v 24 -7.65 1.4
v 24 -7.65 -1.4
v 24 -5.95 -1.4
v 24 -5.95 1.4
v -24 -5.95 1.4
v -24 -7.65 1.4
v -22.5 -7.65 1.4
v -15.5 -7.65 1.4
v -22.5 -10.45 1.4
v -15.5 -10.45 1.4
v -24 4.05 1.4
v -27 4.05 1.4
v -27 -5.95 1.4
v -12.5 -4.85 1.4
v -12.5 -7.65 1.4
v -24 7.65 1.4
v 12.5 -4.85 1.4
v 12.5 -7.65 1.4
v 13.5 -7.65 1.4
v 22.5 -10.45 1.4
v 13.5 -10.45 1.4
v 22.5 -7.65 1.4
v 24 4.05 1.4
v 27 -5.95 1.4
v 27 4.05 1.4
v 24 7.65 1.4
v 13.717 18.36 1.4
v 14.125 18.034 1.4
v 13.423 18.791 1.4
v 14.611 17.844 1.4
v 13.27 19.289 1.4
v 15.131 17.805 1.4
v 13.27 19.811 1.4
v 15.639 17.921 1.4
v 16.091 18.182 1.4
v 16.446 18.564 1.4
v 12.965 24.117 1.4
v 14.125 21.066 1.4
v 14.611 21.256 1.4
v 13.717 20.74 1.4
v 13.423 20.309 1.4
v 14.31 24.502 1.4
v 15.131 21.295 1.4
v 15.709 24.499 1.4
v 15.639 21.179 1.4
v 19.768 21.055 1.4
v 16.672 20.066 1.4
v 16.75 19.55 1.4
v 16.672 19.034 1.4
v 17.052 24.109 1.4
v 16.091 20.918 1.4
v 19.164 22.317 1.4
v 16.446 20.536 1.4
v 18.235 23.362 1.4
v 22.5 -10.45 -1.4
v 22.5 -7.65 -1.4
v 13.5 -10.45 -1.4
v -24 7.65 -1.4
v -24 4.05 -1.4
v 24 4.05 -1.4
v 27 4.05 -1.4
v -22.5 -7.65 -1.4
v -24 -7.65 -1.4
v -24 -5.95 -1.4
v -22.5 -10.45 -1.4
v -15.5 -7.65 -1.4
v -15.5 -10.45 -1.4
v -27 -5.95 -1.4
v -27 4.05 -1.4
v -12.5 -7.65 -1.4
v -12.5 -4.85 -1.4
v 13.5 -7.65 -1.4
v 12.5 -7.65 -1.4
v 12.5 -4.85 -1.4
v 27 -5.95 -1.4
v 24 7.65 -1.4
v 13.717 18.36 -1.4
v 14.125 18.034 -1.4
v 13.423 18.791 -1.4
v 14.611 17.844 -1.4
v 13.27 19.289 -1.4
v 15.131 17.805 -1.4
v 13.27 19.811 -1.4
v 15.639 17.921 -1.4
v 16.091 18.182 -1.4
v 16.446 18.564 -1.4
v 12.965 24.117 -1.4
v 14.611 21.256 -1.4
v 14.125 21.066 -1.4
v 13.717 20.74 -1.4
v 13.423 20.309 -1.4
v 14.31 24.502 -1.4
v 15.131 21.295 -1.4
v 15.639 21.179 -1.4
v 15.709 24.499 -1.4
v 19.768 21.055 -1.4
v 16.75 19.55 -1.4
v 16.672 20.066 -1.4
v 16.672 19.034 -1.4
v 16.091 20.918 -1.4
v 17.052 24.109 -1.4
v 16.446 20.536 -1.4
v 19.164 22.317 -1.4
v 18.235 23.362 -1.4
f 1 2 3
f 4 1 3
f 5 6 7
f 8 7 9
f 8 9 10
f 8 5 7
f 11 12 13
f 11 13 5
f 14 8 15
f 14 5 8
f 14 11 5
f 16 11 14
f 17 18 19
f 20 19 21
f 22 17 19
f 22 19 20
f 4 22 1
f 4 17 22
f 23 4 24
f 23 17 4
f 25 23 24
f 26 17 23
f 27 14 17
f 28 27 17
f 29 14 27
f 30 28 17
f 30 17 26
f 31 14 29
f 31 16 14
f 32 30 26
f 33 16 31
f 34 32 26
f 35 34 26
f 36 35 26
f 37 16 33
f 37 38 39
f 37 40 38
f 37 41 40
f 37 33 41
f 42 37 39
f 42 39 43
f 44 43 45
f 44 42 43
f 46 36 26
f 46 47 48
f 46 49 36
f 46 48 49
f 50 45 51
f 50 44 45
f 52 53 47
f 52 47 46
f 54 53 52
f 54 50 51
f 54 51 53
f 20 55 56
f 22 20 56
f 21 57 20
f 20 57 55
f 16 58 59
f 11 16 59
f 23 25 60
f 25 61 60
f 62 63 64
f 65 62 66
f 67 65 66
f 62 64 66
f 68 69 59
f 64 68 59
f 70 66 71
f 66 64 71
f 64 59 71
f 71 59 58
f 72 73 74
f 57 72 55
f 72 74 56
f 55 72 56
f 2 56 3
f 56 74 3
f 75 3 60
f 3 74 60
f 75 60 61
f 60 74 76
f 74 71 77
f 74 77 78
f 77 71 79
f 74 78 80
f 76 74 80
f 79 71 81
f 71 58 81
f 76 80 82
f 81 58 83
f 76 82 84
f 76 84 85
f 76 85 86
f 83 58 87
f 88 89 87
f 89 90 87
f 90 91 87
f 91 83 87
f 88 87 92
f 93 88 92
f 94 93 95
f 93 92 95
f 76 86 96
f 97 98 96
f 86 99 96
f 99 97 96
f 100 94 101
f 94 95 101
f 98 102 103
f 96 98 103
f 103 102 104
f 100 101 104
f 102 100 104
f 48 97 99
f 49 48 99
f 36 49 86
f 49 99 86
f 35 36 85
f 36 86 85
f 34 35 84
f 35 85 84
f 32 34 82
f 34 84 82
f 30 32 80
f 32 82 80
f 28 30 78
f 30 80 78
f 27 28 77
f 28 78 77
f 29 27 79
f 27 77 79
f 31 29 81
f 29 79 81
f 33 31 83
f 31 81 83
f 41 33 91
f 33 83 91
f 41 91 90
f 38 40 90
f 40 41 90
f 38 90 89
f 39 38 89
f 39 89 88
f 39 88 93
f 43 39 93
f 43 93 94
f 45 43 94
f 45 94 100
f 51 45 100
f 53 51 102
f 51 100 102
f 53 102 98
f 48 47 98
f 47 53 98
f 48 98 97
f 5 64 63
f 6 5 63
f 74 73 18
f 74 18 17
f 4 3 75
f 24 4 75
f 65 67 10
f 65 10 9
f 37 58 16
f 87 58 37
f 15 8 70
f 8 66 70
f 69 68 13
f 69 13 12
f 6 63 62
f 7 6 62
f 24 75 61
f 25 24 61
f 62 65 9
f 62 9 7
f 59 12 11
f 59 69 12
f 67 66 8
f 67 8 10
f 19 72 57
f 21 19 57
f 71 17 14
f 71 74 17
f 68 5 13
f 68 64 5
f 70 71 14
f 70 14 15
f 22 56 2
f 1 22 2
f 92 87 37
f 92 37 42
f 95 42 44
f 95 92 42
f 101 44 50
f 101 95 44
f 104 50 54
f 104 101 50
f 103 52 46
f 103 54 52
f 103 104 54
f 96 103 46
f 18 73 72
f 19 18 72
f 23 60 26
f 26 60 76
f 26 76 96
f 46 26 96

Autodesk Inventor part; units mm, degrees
ref_plane "YZ Plane" through (0, 0, 0) normal (1, 0, 0) x (0, 1, 0)
ref_plane "XZ Plane" through (0, 0, 0) normal (0, 1, 0) x (-1, 0, 0)
ref_plane "XY Plane" through (0, 0, 0) normal (0, 0, 1) x (1, 0, 0)
sketch "Sketch1" plane through (0, 0, 0) normal (0, 0, 1) x (1, 0, 0)
  line L0 (24, 7.65) -> (-24, 7.65)
  line L1 (-24, 7.65) -> (-24, -7.65)
  line L2 (-24, -7.65) -> (24, -7.65)
  line L3 (24, -7.65) -> (24, 7.65)
  line L4 (24, 7.65) -> (-24, -7.65) construction
  line L5 (-24, 7.65) -> (24, -7.65) construction
  line L6 (-22.5, -7.65) -> (-15.5, -7.65)
  line L7 (-15.5, -7.65) -> (-15.5, -10.45)
  line L8 (-15.5, -10.45) -> (-22.5, -10.45)
  line L9 (-22.5, -10.45) -> (-22.5, -7.65)
  line L10 (22.5, -7.65) -> (13.5, -7.65)
  line L11 (13.5, -7.65) -> (13.5, -10.45)
  line L12 (13.5, -10.45) -> (22.5, -10.45)
  line L13 (22.5, -10.45) -> (22.5, -7.65)
  line L14 (24, -5.95) -> (27, -5.95)
  line L15 (27, -5.95) -> (27, 4.05)
  line L16 (27, 4.05) -> (24, 4.05)
  line L17 (24, 4.05) -> (24, -5.95)
  line L18 (-24, -5.95) -> (-27, -5.95)
  line L19 (-27, -5.95) -> (-27, 4.05)
  line L20 (-27, 4.05) -> (-24, 4.05)
  line L21 (-24, 4.05) -> (-24, -5.95)
  line L22 (-12.5, -7.65) -> (12.5, -7.65)
  line L23 (12.5, -7.65) -> (12.5, -4.85)
  line L24 (12.5, -4.85) -> (-12.5, -4.85)
  line L25 (-12.5, -4.85) -> (-12.5, -7.65)
  circle A0 centre (15, 19.55) radius 1.75
  arc A1 (19.768, 21.0552) -> (12.9654, 24.1173) centre (15, 19.55) ccw
  line L26 (-24, 7.65) -> (12.9654, 24.1173)
  line L27 (24, 7.65) -> (19.768, 21.0552)
  point P0 (0, 0)
  point P1 (-25.5, -5.95)
  point P2 (25.5, -5.95)
  point P3 (25.5, 4.05)
  point P4 (-25.5, 4.05)
  point P5 (0, -4.85)
  point P6 (0, 0)
  dimension "d0" = 48
  dimension "d1" = 15.3
  dimension "d2" = 3.5
  dimension "d3" = 30
  dimension "d4" = 2.8
  dimension "d5" = 12
  dimension "d6" = 3
  dimension "d7" = 4.5
  dimension "d8" = 10
  dimension "d9" = 25
  dimension "d10" = 7
  dimension "d11" = 9
  dimension "d12" = 4.5
  dimension "d13" = 4.5
  dimension "d14" = 10
extrude "Extrusion1" add sketch "Sketch1" along normal mid plane 2.8 contours L3 L2 L23 L24 L25 L1 L0 | L0 L26 A1 L27 | L16 L15 L14 L3 | L1 L18 L19 L20 | L13 L12 L11 L2 | L2 L7 L8 L9
